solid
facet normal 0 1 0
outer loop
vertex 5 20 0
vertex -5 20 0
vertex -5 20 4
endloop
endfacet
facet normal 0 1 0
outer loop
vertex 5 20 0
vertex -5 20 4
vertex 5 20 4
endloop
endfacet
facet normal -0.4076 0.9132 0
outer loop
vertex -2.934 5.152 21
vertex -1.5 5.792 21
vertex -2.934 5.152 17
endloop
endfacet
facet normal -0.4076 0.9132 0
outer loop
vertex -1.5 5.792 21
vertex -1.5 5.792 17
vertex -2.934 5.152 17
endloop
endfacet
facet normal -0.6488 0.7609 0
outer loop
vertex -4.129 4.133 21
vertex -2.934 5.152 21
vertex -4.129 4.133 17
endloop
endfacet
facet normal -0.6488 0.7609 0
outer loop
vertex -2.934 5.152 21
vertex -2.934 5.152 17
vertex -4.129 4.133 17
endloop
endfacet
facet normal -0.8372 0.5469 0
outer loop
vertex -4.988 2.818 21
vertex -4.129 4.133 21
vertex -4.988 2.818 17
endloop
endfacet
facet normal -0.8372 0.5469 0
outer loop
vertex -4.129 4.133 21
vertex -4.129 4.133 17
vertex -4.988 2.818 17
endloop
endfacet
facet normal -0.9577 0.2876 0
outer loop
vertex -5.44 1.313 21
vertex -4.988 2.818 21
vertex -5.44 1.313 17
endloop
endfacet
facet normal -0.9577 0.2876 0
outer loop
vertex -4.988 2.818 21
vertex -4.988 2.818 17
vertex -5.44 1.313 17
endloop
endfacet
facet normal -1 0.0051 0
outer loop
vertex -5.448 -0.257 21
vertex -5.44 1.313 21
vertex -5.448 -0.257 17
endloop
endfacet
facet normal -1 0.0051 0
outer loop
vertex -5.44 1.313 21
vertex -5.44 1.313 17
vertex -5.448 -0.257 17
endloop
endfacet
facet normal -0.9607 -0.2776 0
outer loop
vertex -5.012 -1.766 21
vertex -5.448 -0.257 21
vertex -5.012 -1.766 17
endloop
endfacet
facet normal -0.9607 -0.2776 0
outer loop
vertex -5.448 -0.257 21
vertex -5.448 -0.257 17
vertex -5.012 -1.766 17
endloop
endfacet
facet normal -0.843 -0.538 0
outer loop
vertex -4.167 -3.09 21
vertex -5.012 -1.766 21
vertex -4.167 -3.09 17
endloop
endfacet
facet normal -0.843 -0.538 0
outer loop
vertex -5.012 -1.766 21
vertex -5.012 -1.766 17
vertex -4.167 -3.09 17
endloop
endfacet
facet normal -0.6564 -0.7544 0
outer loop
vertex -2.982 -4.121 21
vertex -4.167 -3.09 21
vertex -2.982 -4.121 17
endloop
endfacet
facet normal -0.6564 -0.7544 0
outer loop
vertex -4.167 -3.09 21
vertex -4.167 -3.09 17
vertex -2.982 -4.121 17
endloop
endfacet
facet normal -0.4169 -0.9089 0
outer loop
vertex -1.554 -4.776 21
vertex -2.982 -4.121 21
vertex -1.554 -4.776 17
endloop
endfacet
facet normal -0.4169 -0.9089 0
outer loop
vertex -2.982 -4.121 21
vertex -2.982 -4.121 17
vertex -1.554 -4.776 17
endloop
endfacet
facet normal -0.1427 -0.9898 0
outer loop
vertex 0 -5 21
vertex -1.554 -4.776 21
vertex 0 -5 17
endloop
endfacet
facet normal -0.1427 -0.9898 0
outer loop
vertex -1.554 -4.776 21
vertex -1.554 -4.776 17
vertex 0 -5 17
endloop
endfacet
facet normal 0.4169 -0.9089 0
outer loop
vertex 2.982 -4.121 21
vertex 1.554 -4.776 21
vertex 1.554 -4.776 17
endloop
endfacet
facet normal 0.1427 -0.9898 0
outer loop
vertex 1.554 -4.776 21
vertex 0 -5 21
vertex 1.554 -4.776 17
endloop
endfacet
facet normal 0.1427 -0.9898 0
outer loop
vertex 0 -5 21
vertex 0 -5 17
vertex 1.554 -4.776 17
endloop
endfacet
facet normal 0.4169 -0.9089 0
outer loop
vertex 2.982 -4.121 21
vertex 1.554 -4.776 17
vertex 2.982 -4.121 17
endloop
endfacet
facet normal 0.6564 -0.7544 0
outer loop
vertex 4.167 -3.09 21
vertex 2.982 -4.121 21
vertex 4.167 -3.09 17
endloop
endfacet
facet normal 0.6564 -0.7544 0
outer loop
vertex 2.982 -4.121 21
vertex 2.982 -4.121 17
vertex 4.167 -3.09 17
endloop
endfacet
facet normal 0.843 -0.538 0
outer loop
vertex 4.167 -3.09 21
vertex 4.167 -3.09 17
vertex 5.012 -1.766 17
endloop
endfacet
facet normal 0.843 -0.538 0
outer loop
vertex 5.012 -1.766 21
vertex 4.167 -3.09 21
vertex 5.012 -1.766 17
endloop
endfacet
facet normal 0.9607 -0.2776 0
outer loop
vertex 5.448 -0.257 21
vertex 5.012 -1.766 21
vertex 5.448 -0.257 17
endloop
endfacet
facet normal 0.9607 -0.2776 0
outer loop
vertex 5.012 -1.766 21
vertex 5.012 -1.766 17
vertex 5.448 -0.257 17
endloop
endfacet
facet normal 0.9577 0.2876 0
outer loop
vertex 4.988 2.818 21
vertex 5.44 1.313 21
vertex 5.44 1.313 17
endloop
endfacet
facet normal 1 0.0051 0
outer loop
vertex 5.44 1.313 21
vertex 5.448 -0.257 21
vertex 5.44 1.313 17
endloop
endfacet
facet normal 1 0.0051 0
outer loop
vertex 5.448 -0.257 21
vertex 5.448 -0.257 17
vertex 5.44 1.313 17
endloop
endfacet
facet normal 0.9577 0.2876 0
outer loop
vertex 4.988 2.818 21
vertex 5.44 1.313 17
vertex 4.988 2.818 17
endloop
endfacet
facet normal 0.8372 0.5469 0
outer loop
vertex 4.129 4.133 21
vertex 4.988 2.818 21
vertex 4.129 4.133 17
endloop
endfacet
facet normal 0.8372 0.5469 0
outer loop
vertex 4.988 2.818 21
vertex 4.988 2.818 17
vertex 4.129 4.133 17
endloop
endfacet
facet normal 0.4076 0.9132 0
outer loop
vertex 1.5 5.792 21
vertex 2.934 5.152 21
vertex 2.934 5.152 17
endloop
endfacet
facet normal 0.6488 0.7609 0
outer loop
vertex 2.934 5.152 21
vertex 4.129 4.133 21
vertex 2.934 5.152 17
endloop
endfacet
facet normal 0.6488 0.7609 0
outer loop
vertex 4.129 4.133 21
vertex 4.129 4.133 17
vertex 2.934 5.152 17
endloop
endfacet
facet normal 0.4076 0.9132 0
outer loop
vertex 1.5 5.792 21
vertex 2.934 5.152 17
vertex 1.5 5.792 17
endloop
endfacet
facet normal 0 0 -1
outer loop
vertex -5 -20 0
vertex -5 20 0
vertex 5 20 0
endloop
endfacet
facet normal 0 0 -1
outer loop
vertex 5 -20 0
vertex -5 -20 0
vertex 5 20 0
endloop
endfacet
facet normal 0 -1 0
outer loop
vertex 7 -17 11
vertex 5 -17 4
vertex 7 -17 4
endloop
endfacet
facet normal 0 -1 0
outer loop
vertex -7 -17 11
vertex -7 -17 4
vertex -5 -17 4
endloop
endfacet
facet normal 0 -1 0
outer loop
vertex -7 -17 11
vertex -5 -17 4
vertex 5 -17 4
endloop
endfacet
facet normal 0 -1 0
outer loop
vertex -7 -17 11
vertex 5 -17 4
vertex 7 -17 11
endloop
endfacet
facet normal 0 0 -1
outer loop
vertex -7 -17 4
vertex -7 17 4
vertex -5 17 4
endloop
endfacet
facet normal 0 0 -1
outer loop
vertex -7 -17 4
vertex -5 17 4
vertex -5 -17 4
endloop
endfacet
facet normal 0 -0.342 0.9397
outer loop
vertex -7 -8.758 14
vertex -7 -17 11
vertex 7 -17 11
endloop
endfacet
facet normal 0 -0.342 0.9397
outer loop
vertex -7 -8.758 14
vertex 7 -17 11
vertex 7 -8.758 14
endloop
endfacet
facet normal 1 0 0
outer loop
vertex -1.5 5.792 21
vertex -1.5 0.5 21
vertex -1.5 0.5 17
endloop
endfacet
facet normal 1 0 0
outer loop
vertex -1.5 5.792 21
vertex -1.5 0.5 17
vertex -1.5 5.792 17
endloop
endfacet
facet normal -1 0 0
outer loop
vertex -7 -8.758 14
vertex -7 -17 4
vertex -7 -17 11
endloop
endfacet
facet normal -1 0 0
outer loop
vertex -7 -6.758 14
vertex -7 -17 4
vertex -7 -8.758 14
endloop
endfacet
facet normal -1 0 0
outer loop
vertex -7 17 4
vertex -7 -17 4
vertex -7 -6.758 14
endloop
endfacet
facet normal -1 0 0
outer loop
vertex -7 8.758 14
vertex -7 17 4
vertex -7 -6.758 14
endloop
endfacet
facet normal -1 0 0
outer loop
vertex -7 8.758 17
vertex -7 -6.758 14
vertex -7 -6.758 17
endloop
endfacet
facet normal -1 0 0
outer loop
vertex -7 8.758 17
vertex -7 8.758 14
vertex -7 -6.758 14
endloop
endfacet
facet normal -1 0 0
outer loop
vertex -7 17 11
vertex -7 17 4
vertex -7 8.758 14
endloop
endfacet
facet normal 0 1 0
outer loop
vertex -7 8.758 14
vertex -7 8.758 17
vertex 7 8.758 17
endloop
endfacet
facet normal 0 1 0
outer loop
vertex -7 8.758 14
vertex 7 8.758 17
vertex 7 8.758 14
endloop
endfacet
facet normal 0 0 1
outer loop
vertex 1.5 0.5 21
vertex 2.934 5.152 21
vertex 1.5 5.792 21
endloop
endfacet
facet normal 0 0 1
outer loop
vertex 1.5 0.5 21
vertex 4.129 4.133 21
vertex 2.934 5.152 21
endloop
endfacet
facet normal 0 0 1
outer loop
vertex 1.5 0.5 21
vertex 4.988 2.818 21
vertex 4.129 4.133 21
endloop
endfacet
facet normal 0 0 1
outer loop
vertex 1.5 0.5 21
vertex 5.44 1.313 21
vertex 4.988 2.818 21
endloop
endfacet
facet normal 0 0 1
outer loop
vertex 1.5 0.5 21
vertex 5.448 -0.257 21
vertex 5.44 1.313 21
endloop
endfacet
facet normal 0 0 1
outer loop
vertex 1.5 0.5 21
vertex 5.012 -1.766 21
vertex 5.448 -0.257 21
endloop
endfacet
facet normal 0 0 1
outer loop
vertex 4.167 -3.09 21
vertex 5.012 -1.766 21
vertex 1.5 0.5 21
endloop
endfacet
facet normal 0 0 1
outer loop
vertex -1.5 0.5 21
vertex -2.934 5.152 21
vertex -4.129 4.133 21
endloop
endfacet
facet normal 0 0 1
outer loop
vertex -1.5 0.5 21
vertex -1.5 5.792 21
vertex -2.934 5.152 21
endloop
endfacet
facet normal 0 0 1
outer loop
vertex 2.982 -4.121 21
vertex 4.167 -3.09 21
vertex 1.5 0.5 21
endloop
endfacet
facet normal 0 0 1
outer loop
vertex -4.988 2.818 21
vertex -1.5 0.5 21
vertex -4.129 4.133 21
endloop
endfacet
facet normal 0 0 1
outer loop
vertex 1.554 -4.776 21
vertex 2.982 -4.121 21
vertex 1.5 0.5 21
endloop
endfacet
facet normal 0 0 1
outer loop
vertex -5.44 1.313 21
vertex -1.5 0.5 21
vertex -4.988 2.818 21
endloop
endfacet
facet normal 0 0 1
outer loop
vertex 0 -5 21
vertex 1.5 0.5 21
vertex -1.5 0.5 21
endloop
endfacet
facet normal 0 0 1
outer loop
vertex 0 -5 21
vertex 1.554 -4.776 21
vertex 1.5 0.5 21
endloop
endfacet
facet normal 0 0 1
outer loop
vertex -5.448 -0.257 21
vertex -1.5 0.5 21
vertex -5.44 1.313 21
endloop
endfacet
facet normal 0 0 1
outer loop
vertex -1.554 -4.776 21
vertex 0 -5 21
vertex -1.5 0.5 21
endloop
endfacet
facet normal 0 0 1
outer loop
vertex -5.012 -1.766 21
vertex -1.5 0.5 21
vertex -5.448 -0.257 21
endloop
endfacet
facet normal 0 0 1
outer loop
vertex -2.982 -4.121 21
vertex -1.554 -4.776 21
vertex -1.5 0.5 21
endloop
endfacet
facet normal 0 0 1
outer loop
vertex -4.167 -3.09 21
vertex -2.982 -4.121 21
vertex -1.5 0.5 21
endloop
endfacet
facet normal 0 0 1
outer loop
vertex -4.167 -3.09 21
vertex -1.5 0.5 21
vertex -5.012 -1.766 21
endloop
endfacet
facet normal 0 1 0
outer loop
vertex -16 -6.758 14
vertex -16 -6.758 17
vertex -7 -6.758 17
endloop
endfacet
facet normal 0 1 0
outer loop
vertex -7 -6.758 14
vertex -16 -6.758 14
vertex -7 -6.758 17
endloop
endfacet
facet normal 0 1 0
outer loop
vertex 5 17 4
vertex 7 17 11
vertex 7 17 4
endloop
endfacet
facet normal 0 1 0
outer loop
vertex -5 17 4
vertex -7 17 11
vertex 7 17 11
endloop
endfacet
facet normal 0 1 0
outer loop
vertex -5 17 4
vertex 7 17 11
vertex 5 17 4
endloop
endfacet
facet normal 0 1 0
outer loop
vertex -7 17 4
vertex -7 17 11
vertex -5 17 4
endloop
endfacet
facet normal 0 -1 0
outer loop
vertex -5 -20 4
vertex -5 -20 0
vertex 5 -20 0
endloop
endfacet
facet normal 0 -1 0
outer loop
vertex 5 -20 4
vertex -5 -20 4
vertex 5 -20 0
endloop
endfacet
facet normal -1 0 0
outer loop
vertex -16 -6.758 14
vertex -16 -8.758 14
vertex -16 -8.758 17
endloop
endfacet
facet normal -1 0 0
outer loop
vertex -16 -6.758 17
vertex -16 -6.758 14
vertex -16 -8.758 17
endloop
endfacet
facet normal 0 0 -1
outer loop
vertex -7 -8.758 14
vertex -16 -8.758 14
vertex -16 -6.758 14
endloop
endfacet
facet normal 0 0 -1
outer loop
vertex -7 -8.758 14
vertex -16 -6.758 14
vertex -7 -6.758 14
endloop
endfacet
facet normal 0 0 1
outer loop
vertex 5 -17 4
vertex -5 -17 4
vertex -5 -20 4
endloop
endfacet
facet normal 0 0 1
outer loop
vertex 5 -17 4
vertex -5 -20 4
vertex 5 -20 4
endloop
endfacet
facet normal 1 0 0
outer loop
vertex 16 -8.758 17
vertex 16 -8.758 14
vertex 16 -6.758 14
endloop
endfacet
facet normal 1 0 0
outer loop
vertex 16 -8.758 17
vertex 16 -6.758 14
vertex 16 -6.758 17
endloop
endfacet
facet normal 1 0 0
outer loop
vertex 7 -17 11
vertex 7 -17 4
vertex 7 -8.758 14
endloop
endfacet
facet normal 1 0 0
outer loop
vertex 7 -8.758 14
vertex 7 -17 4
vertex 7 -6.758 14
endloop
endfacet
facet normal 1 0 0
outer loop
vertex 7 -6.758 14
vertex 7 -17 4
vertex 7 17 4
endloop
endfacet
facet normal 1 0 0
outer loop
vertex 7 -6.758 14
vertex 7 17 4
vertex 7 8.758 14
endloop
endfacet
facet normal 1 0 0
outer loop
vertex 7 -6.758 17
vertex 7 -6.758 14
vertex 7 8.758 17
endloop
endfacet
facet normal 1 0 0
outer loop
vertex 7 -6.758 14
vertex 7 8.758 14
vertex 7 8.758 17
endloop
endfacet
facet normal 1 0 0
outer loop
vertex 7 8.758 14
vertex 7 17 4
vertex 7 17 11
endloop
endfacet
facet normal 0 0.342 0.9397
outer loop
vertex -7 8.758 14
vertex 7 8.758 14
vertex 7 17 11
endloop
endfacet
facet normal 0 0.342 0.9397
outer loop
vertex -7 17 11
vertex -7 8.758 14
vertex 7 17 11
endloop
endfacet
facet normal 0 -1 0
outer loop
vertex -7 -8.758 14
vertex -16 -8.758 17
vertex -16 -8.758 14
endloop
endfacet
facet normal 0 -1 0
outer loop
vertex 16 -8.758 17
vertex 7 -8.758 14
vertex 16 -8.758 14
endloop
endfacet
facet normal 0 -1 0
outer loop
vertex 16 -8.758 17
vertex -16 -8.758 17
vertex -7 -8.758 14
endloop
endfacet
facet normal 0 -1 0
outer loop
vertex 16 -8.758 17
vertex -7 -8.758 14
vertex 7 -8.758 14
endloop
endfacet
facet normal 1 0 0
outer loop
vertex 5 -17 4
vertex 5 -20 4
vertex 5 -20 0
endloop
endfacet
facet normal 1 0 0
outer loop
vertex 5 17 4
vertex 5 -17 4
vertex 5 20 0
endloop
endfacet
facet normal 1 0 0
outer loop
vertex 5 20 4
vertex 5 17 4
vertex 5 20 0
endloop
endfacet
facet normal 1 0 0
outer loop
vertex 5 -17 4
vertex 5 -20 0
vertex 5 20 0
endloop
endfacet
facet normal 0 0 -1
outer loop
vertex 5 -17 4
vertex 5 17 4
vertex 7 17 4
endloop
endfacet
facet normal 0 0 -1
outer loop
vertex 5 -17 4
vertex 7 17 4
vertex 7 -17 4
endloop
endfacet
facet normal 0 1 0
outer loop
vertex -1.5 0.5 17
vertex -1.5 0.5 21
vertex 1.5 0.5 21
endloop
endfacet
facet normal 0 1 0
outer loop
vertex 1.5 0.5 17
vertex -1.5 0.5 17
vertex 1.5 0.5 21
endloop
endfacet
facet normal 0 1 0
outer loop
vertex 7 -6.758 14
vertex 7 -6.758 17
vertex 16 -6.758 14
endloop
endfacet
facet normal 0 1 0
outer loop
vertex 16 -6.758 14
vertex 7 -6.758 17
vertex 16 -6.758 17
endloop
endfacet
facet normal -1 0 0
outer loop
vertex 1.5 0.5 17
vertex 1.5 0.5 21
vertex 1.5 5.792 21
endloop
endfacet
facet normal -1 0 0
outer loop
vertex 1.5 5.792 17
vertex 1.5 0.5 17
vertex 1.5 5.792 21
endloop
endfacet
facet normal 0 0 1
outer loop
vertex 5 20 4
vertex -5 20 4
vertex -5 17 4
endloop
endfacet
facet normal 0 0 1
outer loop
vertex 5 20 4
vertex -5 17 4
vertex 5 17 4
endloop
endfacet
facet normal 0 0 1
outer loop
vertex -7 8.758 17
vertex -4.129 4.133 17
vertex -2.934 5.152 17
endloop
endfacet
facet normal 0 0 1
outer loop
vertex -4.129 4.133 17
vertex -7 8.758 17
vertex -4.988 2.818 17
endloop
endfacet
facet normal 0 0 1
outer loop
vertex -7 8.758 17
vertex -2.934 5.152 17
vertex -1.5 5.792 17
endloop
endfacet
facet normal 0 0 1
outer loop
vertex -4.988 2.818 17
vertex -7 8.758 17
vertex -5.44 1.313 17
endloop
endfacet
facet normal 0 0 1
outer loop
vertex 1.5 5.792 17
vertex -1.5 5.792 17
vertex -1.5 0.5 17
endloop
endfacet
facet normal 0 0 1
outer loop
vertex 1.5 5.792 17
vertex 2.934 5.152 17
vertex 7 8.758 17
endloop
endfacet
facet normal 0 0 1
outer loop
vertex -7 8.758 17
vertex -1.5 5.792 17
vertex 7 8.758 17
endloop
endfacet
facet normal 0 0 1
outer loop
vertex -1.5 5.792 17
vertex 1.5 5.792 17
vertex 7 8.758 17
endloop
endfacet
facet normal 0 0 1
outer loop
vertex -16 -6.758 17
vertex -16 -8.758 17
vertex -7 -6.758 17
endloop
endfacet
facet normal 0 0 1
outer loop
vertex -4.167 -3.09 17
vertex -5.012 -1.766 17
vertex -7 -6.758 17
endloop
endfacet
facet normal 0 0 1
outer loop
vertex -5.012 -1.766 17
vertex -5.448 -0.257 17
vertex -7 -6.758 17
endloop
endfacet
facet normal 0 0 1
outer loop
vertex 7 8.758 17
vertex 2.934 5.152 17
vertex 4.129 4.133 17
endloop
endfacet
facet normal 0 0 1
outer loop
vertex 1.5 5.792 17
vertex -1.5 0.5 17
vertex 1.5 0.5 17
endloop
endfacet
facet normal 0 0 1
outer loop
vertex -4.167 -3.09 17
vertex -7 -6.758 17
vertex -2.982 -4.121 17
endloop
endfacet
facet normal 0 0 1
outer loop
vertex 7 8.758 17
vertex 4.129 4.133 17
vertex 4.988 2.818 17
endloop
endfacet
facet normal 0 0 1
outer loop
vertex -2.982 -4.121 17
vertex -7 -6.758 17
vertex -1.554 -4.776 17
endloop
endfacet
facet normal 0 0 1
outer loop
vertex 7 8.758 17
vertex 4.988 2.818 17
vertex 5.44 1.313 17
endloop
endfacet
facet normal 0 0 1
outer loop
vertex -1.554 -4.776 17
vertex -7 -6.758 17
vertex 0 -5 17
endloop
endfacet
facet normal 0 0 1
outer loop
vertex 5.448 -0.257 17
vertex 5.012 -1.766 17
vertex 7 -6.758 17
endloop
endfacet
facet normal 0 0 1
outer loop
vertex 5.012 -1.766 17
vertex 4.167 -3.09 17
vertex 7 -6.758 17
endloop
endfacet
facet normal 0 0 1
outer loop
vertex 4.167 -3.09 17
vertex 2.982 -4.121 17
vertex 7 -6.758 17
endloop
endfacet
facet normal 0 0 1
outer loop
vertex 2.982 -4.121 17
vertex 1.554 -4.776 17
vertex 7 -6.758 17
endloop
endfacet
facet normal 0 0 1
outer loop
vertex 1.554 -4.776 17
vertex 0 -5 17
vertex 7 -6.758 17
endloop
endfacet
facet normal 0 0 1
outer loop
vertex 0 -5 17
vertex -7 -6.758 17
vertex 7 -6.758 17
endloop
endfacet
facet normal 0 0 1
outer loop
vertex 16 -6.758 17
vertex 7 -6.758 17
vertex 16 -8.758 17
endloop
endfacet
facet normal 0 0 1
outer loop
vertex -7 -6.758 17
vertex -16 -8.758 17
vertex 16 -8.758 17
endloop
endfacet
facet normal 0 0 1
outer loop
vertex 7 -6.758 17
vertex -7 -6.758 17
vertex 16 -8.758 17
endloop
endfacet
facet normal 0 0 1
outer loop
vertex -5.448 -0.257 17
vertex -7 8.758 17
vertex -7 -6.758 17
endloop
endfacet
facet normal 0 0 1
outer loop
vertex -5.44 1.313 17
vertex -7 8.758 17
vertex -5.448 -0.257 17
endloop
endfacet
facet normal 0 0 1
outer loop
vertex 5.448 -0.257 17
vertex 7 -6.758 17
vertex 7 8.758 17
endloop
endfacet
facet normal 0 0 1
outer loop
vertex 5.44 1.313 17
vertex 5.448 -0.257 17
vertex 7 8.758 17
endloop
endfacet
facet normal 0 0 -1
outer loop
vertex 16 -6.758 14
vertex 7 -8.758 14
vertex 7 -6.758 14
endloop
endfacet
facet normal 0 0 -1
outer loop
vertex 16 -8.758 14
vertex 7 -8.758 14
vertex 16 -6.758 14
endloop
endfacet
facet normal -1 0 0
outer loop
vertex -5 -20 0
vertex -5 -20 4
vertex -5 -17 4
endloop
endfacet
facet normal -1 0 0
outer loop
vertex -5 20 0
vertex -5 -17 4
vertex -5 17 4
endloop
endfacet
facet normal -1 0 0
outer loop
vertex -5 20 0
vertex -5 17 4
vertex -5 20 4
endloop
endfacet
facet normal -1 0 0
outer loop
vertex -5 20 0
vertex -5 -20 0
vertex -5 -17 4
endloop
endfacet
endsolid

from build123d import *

# Parameters (mm, degrees)
SKETCH_1_W           = 10
SKETCH_1_H           = 40
EXTRUDE_1_DEPTH      = 4
EXTRUDE_2_DEPTH      = 7
EXTRUDE_2_DEPTH_BACK = 7
SKETCH_4_W           = 32
SKETCH_4_H           = 3
EXTRUDE_3_DEPTH      = 2
SKETCH_5_R           = 5.5
EXTRUDE_4_DEPTH      = 4
SKETCH_6_W           = 3
SKETCH_6_H           = 5.5
CUT_EXTRUDE_1_DEPTH  = 4


with BuildPart() as part:
    # Эскиз1 → Бобышка-Вытянуть1 (new body)
    with BuildSketch(Plane.XY):
        Rectangle(SKETCH_1_W, SKETCH_1_H)
    extrude(amount=EXTRUDE_1_DEPTH)

    # Эскиз3 → Бобышка-Вытянуть2 (add, two sides: drawn at the far end of the back side and taken through both)
    with BuildSketch(Plane(origin=(0, 0, 0), x_dir=(0, 0, -1), z_dir=(1, 0, 0)).offset(-EXTRUDE_2_DEPTH_BACK)):
        Polygon((-17, -8.757567742), (-17, 8.757567742), (-14, 8.757567742), (-11, 17), (-4, 17), (-4, -17), (-11, -17), (-14, -8.757567742), align=None)
    extrude(amount=EXTRUDE_2_DEPTH + EXTRUDE_2_DEPTH_BACK)

    # Эскиз4 → Бобышка-Вытянуть3 (add)
    with BuildSketch(Plane.XZ.offset(8.757567742)):
        with Locations((0, 15.5)):
            Rectangle(SKETCH_4_W, SKETCH_4_H)
    extrude(amount=-EXTRUDE_3_DEPTH)

    # Эскиз5 → Бобышка-Вытянуть4 (add)
    with BuildSketch(Plane.XY.offset(17)):
        with Locations(Location((0, 0.5, 0), (0, 0, 180))):
            Circle(SKETCH_5_R)
    extrude(amount=EXTRUDE_4_DEPTH)

    # Эскиз6 → Вырез-Вытянуть1 (cut)
    with BuildSketch(Plane.XY.offset(21)):
        with Locations((0, 3.25)):
            Rectangle(SKETCH_6_W, SKETCH_6_H)
    extrude(amount=-CUT_EXTRUDE_1_DEPTH, mode=Mode.SUBTRACT)


solid = part.part
